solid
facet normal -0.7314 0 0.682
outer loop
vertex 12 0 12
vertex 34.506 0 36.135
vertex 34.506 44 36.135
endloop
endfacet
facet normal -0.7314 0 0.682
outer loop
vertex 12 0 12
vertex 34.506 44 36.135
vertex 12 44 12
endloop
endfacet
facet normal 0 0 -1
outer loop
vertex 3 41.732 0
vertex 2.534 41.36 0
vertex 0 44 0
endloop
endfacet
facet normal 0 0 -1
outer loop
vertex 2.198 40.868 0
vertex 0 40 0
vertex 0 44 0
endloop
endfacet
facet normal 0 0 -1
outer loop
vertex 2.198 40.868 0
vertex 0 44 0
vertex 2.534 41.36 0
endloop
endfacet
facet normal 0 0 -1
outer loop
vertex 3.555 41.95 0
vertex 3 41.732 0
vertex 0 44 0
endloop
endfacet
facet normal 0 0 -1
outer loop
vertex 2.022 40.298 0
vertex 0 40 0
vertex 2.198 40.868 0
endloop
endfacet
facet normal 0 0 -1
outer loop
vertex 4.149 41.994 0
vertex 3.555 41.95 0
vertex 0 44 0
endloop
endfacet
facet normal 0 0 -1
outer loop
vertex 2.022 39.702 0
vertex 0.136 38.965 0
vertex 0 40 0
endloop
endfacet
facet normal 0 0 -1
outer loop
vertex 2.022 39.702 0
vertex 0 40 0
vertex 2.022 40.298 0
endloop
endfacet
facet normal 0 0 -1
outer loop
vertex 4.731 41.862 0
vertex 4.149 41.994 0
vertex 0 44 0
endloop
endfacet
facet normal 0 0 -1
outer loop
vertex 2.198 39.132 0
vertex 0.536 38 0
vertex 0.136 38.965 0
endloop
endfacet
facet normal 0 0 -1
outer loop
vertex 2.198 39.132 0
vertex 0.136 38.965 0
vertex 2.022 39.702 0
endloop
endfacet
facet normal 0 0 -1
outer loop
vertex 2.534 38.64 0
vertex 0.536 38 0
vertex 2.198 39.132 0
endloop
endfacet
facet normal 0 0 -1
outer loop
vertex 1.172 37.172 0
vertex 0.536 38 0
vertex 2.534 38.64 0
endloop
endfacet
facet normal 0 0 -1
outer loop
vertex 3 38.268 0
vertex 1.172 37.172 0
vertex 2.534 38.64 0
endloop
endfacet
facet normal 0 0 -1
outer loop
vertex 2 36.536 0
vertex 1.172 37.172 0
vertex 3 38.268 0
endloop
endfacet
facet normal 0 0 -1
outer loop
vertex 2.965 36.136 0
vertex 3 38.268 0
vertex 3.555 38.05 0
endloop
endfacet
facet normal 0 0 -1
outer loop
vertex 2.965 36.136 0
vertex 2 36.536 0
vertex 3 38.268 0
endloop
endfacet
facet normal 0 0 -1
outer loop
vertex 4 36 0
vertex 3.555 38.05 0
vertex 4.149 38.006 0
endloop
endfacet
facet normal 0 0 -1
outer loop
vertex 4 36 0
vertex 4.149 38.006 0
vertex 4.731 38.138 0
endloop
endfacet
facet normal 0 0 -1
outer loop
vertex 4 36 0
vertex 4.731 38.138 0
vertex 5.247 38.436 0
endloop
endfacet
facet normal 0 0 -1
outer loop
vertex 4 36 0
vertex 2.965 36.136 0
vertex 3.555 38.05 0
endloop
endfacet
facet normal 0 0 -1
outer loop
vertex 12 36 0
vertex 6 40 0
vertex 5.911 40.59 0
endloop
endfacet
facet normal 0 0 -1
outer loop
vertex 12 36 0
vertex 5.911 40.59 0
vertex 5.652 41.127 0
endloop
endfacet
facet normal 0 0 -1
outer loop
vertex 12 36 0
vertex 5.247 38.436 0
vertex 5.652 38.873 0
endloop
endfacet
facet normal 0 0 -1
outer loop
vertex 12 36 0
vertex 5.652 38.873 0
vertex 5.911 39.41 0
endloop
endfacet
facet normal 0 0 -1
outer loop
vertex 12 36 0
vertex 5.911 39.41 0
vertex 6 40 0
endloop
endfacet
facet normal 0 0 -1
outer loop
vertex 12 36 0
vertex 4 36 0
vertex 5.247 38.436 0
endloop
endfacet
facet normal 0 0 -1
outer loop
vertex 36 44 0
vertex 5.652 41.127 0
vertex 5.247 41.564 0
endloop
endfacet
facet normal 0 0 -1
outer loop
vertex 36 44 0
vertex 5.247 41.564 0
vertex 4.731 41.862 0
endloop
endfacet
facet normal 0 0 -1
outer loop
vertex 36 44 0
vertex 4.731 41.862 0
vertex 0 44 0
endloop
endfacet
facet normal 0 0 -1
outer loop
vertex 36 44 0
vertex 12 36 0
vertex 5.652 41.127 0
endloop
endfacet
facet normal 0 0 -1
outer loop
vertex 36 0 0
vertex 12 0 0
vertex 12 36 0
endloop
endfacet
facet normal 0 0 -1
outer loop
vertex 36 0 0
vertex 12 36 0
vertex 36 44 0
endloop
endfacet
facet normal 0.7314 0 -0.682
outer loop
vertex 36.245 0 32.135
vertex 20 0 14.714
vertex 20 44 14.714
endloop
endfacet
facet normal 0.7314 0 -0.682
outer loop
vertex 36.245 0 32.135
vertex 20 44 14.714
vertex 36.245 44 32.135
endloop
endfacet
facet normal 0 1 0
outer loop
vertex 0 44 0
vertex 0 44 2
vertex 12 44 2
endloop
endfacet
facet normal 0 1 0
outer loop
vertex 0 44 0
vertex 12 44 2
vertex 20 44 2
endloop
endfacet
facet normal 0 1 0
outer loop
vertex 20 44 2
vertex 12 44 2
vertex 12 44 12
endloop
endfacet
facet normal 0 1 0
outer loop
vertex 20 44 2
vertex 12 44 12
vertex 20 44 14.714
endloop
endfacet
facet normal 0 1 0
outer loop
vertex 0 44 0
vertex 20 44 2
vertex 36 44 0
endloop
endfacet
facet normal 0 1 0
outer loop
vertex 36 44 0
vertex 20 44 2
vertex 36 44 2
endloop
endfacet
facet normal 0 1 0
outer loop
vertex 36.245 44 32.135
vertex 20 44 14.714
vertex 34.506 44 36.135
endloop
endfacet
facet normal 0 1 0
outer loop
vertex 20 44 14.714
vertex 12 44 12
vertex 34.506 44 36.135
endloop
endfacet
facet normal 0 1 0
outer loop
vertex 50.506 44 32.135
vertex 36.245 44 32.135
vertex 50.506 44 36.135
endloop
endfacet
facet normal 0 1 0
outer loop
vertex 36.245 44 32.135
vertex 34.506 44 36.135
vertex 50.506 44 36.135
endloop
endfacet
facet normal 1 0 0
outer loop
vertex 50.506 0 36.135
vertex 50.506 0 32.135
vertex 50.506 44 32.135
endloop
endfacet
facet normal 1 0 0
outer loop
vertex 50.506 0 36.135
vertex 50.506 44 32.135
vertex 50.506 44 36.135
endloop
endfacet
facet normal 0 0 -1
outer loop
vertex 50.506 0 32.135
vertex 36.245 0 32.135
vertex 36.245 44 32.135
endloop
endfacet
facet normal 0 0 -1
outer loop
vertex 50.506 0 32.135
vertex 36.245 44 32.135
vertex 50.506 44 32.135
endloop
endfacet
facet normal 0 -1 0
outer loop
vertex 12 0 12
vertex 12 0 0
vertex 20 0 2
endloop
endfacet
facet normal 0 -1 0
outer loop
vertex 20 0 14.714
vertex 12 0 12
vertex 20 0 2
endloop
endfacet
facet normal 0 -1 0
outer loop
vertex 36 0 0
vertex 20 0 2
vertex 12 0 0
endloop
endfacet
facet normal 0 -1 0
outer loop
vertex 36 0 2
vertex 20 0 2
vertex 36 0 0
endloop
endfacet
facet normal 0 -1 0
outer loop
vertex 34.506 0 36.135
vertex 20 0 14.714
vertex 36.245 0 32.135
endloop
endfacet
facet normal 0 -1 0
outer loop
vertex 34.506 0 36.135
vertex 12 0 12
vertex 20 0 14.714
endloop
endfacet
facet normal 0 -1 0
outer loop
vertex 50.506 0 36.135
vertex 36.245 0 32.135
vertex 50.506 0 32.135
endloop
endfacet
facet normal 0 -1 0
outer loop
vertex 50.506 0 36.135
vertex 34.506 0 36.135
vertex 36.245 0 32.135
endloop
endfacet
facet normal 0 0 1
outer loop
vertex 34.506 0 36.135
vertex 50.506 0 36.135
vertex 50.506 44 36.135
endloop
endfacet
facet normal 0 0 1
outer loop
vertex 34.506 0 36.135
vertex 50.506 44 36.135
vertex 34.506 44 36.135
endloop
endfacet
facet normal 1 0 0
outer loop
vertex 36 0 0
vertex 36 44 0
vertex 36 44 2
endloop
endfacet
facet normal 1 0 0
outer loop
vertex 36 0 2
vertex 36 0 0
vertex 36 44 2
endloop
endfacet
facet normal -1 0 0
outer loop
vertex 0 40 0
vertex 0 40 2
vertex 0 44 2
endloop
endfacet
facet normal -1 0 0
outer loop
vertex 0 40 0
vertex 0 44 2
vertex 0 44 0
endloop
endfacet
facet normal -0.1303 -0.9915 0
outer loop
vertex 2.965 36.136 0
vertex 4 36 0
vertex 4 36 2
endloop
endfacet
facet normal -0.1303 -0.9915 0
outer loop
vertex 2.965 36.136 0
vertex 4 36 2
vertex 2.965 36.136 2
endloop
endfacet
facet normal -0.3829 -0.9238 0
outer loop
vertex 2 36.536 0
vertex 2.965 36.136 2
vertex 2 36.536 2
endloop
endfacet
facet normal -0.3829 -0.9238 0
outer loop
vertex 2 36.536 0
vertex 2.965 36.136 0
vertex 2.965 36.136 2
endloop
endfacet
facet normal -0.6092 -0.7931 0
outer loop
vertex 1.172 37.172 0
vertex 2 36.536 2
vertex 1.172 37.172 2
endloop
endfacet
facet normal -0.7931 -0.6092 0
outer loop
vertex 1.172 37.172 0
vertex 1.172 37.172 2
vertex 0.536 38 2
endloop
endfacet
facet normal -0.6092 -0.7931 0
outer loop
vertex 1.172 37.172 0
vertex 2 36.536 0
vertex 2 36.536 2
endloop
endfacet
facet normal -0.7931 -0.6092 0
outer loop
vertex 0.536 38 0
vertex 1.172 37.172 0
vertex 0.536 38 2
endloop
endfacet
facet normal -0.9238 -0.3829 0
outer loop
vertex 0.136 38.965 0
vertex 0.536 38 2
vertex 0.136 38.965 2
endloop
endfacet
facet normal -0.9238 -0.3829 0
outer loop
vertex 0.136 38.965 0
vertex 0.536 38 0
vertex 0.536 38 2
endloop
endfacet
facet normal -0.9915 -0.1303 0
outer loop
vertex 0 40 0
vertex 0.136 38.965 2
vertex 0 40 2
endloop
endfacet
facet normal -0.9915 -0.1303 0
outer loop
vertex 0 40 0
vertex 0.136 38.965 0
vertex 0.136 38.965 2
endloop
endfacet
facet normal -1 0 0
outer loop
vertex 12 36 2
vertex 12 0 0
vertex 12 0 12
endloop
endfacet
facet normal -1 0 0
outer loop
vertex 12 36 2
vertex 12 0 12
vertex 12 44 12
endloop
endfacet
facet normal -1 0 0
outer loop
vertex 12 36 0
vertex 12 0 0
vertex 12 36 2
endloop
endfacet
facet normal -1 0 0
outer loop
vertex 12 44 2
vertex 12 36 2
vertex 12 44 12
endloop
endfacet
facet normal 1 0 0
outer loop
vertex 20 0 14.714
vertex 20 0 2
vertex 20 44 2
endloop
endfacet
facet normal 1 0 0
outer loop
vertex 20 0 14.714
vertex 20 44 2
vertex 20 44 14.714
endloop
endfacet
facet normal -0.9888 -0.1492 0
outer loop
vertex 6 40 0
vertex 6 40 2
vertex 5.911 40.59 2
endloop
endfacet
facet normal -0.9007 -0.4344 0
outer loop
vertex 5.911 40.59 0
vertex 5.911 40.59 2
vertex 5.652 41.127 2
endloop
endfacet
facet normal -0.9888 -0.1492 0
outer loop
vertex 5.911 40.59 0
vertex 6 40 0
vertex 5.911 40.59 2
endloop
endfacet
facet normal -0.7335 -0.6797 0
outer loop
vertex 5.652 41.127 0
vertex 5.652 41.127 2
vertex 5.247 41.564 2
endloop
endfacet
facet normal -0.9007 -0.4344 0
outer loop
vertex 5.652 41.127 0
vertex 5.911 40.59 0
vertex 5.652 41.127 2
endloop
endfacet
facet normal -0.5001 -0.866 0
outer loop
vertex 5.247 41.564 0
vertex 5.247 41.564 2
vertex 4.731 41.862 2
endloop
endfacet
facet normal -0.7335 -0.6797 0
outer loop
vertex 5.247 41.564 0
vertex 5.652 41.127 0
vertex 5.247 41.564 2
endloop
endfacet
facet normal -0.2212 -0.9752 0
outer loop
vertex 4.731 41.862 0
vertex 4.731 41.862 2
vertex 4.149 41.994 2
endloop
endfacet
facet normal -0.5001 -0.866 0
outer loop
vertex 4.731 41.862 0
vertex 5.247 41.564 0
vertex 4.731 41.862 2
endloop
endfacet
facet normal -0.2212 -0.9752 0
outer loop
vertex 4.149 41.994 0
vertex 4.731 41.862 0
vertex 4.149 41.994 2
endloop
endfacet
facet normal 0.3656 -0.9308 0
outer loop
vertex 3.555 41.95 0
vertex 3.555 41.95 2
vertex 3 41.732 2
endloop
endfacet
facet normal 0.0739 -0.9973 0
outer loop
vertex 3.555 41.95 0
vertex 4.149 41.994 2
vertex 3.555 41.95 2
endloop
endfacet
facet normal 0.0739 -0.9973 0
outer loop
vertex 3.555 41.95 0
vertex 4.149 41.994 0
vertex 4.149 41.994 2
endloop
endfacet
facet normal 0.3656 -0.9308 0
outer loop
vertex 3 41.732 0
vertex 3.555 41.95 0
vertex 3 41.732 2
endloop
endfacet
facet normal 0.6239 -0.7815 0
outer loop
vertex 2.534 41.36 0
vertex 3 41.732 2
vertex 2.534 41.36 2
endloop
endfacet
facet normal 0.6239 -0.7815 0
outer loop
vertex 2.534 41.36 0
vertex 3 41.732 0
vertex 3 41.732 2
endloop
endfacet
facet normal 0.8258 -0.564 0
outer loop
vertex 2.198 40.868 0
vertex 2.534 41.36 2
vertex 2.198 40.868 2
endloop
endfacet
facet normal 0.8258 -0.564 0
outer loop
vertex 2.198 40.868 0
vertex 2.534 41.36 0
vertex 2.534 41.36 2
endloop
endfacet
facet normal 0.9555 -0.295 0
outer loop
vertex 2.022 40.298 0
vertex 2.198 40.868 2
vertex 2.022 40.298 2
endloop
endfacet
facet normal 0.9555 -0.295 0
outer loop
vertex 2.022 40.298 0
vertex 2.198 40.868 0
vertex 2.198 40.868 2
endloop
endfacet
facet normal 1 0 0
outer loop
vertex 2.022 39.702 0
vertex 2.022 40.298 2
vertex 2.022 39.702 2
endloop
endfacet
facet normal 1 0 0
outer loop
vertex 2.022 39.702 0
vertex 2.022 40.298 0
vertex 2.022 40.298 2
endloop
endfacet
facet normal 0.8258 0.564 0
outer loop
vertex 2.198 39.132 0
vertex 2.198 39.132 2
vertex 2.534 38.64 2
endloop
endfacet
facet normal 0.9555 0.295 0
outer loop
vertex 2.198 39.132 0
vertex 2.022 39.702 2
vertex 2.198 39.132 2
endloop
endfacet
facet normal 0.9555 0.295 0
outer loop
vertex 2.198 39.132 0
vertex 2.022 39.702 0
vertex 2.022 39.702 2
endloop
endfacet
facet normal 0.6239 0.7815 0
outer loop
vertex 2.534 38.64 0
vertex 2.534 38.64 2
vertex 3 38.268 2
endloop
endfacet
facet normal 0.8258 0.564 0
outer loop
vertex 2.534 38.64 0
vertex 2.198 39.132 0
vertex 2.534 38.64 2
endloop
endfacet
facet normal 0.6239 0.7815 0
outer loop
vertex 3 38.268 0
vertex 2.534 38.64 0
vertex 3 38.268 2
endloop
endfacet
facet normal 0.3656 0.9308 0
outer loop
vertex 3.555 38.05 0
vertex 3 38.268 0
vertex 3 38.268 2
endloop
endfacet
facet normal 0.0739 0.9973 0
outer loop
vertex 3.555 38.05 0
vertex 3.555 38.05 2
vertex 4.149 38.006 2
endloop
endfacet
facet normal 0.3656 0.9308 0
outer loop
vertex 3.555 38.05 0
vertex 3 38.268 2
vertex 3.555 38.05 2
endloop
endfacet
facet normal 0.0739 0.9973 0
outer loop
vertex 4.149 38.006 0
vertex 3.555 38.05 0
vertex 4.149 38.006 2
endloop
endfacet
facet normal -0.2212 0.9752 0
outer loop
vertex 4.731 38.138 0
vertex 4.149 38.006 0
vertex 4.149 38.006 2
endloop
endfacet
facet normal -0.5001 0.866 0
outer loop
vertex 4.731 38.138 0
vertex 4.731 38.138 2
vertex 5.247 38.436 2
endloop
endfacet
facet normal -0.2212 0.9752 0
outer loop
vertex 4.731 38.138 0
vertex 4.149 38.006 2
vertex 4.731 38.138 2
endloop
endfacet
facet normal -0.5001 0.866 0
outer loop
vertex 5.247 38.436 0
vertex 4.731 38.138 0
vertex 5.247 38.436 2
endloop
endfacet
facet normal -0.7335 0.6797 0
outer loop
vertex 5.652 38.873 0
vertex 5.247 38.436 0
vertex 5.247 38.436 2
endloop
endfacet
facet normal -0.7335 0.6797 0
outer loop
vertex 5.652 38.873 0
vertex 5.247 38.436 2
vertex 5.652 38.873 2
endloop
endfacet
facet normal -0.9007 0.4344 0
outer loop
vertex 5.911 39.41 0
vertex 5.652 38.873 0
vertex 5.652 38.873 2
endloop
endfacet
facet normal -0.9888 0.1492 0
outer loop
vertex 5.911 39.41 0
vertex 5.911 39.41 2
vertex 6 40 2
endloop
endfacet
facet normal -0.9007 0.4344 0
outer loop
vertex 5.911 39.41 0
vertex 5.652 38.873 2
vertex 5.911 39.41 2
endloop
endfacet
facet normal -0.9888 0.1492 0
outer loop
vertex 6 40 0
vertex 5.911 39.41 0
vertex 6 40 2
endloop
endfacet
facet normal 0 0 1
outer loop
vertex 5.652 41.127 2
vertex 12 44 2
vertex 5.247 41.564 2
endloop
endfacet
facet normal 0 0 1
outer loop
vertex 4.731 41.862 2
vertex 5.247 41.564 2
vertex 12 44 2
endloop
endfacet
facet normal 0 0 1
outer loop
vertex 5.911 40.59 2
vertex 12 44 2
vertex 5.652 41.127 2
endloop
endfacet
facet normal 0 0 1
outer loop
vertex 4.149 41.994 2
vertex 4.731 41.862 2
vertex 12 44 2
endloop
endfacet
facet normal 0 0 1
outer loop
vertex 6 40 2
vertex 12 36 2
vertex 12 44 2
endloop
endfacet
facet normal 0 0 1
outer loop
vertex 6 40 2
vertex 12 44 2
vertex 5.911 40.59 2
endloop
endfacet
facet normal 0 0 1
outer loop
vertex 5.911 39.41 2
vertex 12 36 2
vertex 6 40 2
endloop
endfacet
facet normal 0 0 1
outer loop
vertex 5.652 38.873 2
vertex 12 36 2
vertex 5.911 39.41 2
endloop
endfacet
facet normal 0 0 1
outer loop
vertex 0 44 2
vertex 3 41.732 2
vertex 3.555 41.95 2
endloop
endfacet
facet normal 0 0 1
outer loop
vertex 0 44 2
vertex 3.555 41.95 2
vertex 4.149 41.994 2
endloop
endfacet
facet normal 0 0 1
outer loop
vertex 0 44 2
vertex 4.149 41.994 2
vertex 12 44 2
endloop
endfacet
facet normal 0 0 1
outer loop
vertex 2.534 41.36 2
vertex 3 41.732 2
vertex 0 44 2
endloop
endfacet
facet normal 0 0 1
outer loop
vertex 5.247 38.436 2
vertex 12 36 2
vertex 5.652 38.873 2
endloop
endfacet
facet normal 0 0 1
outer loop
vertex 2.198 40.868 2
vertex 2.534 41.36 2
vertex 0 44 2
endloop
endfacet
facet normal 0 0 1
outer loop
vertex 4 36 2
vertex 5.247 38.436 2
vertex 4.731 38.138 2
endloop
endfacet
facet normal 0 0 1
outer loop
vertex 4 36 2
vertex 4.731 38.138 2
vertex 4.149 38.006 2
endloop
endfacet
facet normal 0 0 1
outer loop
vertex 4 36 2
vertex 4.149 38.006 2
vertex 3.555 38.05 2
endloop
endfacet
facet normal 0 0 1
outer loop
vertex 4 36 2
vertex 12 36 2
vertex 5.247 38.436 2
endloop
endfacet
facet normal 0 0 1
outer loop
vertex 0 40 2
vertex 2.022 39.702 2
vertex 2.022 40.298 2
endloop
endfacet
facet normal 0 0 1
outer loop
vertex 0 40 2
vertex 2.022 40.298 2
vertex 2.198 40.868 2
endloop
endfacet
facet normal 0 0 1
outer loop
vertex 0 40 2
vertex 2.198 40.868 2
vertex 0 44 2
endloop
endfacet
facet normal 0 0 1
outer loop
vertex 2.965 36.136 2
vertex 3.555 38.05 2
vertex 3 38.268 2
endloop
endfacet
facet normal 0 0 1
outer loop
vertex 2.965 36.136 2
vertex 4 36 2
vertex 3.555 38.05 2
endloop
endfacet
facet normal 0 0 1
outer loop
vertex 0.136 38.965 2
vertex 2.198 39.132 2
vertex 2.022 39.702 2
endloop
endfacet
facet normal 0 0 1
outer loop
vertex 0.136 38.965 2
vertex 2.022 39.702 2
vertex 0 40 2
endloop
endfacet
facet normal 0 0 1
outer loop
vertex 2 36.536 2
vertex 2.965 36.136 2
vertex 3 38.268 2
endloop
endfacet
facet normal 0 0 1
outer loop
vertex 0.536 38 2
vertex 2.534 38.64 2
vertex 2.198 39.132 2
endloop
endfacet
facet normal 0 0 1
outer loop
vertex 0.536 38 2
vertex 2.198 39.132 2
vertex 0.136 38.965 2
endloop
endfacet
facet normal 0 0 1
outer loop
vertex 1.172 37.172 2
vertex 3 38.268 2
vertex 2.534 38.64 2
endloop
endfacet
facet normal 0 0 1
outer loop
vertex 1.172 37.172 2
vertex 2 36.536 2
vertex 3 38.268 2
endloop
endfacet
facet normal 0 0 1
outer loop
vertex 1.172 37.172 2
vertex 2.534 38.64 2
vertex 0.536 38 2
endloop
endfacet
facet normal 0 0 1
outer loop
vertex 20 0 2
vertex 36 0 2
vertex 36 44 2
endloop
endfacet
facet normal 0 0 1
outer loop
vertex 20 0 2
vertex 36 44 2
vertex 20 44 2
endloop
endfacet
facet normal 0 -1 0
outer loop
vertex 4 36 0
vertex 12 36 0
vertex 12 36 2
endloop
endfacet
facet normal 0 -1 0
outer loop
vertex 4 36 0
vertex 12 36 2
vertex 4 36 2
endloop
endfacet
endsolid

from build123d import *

# Parameters (mm, degrees)
F1_DEPTH = 44
F2_R     = 2
F3_DEPTH = 25


with BuildPart() as f1:
    # F0 (on Front) → F1 (new body)
    with BuildSketch(Plane.XZ):
        Polygon((0, 2), (0, 0), (36, 0), (36, 2), (20, 2), (20, 14.713833), (36.245195, 32.134672), (50.505946, 32.134672), (50.505946, 36.134672), (34.505946, 36.134672), (12, 12), (12, 2), align=None)
    extrude(amount=-F1_DEPTH)

    # F2 (on Top) → F3 (cut)
    with BuildSketch(Plane.XY):
        with Locations((4, 40)):
            Circle(F2_R)
        with BuildLine():
            Line((12, 0), (12, 36))
            Line((12, 36), (4, 36))
            ThreePointArc((4, 36), (1.171573, 37.171573), (0, 40))
            Line((0, 40), (0, 0))
            Line((0, 0), (12, 0))
        make_face()
    extrude(amount=F3_DEPTH, mode=Mode.SUBTRACT)


solid = f1.part
